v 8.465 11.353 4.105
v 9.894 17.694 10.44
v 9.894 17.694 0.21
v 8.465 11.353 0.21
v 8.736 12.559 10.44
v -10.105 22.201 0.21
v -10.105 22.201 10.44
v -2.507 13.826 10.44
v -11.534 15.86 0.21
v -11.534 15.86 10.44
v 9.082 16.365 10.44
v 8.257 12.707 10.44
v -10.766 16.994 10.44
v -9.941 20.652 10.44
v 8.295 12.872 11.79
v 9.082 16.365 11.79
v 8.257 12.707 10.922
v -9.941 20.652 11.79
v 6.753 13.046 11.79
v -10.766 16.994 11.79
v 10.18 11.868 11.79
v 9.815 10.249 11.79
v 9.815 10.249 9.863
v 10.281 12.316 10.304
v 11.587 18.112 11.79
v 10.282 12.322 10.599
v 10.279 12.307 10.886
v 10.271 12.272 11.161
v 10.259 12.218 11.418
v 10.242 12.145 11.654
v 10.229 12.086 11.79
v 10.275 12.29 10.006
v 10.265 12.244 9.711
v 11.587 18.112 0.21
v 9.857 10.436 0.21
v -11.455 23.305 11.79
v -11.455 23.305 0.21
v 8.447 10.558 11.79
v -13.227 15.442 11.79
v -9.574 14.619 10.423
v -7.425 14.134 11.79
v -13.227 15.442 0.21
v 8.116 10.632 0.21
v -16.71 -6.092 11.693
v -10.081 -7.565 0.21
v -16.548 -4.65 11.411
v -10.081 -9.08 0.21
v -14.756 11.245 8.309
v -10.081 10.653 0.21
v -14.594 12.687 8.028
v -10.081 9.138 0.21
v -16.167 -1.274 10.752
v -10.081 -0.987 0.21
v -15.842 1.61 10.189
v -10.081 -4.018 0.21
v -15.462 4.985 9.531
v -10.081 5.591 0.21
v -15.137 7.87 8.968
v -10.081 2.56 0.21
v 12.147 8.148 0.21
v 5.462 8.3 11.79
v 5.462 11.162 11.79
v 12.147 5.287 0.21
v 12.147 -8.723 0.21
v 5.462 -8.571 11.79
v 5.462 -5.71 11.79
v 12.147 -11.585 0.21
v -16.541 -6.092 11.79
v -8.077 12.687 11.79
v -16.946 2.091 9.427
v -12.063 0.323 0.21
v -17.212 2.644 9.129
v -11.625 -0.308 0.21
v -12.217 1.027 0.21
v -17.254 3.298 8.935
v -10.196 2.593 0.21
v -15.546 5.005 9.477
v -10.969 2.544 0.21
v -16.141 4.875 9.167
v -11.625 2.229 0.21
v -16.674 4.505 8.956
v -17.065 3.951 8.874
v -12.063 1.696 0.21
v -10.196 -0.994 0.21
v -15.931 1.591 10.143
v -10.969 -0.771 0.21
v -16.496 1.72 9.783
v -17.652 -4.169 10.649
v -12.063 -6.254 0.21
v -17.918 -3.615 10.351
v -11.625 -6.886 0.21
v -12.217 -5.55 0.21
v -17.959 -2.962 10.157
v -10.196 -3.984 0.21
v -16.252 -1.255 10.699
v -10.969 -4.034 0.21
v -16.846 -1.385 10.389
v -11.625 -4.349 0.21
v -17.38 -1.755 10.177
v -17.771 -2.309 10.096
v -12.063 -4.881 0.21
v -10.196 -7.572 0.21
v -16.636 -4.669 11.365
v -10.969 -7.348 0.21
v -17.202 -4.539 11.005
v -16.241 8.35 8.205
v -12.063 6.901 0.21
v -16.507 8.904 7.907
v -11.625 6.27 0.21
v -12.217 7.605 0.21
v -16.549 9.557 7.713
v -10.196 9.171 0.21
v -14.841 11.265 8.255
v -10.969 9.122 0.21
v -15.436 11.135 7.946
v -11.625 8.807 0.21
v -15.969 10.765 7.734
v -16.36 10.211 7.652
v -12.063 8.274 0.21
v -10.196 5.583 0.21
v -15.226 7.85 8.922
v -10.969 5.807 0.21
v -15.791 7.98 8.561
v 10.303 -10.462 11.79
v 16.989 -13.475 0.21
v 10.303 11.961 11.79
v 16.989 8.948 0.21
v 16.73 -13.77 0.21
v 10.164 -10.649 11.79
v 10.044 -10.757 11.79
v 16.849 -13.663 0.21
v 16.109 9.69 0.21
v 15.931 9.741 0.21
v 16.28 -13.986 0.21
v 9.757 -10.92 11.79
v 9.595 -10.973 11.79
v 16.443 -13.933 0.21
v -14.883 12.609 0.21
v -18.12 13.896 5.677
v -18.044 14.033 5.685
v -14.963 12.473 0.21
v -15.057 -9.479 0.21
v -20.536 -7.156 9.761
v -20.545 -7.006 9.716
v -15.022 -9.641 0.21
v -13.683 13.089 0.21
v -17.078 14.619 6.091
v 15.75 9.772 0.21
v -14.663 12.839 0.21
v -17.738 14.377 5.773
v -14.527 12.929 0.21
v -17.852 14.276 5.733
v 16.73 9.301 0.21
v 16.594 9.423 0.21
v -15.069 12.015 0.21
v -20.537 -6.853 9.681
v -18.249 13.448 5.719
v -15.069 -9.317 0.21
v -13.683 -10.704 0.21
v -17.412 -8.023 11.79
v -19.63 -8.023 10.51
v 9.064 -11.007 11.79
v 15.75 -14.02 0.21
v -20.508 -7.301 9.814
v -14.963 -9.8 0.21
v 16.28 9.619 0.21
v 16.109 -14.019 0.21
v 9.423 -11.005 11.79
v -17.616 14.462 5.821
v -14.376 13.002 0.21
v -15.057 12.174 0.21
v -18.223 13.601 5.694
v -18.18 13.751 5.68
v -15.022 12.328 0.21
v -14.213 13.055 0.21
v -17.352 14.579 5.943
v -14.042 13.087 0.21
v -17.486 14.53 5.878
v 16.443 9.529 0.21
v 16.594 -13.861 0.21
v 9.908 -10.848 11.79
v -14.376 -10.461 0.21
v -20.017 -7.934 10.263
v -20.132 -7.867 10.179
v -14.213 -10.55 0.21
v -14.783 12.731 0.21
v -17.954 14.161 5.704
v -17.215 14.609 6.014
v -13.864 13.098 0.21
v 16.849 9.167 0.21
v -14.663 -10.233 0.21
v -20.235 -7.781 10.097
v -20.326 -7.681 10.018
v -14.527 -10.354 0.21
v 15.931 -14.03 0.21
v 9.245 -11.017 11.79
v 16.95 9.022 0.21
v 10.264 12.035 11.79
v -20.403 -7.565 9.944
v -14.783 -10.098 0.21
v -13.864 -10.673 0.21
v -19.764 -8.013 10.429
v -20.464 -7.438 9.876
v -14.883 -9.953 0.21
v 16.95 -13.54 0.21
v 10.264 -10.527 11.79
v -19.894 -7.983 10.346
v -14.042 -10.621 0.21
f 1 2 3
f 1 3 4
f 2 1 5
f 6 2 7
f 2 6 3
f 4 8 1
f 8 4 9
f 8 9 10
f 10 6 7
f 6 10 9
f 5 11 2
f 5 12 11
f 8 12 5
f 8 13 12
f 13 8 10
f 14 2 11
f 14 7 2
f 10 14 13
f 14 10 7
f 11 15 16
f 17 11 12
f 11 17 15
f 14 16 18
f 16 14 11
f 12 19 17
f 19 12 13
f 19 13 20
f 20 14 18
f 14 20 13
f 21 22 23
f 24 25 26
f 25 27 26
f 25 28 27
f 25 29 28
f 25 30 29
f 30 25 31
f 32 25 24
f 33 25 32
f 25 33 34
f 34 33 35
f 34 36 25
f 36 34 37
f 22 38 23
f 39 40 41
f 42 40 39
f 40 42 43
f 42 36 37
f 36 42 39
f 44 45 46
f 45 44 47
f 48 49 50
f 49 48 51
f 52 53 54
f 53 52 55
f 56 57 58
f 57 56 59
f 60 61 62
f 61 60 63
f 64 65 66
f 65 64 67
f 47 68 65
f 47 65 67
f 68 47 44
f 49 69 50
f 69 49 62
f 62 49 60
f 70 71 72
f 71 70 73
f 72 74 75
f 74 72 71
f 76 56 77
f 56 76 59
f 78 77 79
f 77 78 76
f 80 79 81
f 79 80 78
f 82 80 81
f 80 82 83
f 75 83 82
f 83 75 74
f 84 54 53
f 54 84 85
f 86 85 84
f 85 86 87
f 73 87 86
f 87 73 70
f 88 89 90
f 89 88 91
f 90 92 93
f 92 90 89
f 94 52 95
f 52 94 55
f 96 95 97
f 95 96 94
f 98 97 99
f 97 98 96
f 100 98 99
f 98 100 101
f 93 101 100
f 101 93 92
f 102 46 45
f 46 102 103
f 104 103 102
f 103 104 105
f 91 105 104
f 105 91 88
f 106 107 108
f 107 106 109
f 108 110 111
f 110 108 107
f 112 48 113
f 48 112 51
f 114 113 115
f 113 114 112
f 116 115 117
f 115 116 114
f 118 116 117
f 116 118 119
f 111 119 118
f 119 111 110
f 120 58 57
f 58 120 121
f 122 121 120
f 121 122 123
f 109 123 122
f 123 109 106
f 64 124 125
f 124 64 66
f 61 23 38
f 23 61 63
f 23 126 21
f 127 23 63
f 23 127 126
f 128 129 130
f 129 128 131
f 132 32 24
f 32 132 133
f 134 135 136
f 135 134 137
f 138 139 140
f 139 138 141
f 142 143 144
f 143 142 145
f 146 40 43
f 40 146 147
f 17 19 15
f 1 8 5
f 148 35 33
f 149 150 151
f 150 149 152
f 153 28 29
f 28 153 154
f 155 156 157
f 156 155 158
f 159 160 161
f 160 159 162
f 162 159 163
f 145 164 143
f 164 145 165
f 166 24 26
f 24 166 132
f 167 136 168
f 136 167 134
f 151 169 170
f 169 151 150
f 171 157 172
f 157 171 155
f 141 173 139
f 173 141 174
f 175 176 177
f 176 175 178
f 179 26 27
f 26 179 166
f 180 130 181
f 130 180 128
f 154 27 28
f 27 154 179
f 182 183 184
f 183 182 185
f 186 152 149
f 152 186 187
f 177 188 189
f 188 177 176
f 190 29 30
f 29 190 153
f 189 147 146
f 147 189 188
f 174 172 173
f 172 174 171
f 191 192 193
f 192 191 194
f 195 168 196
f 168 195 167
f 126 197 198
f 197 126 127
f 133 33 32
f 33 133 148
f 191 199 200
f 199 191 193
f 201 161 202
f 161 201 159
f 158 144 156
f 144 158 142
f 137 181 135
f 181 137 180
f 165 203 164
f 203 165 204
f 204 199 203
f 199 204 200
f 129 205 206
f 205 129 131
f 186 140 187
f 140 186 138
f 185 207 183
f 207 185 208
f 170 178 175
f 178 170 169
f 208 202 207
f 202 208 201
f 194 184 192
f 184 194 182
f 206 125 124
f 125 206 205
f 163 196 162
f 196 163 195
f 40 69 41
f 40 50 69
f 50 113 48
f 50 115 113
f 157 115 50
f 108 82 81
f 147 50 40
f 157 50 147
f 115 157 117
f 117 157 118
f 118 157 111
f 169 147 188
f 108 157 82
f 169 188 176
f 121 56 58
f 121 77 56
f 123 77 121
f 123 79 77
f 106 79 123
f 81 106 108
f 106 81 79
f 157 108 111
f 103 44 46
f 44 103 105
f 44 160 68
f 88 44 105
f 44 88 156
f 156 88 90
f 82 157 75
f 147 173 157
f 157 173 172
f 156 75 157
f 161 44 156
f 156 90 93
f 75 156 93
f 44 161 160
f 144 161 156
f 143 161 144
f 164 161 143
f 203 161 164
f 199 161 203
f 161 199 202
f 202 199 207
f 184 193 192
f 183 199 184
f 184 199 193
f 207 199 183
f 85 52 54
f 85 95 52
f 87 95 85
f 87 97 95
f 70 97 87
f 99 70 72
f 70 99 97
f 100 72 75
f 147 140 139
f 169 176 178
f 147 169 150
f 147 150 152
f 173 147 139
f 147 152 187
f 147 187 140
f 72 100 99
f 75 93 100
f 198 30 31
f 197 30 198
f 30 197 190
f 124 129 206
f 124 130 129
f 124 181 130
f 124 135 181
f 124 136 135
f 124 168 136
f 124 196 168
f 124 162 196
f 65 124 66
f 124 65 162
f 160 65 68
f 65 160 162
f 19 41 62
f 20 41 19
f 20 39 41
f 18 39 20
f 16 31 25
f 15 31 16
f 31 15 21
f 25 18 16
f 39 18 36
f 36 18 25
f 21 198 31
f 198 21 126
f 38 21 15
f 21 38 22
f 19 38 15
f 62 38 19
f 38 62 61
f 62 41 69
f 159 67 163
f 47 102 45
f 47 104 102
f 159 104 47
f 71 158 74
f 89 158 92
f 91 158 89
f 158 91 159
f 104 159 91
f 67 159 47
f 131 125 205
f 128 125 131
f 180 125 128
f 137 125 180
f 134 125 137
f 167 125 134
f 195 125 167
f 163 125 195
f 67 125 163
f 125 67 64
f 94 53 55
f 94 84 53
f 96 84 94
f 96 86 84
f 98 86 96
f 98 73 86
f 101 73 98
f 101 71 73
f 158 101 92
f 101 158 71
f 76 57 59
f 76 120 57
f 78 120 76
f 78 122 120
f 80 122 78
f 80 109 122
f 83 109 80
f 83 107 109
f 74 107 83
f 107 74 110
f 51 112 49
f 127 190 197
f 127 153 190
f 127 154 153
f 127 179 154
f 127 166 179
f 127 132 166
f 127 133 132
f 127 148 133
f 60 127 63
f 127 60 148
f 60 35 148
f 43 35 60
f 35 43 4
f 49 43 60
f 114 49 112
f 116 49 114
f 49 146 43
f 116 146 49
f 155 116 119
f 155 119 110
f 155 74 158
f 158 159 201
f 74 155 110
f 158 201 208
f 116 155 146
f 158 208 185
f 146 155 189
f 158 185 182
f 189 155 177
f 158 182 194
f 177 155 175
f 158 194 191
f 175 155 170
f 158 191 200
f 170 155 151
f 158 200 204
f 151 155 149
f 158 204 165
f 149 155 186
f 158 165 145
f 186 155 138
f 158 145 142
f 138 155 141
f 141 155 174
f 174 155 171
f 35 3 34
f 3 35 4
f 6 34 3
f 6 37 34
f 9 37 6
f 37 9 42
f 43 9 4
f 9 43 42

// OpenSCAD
// file: Abar.scad
// generate C-channel for later use in cut-outs

mW = 16.33;
mH = 12.66;
L = 120;
pad=.1;
W = mW+pad;
H = mH+pad;
block = [L,W,H];
cutW = (1.5 * 2) + (pad * 2);
cutH = (2.0 + pad);

module abar(bblock=block){

translate([0,0,H/2])
difference(){
	cube(bblock, center=true);
	
	translate([0,0,cutH/2+.01])
		cube([L,W-cutW, H-cutH], center=true);
	}
}

abar();
// main file
// attach things to base...

use <./Abar.scad>

cB=25;
tubeXY = 19.25;
swX = 20.5;
swY = 10.3;
swZ = 6.5;
wireThick = 3.1;
wireZ = 3.65;
wire1 = 1.11;
wire2 = 12.5;
wire3 = 19.5;
leverHinge = 3.4;
leverExtends = 19.35;
hole1X = 5.15;
hole2X = 14.67;
holeY = 2.78;
holeRad = 2.5/2;
sur = 1.56;
totalX = sur*2 + swX;
totalY = sur + swY;
totalZ = swZ + sur;
posX = totalX/2;
posY = totalY/2 + sur/2;
posZ = totalZ/2;
groove= 1.75;
pH = 30;
Ang = -120;

module switch(){
	cube([swX,swY,swZ], center=true);
	translate([0 ,-posY,-.1])
		cube([wire3, 3+2+.1, wireZ+.1], center=true);
}

module switchbox(){
	difference(){
		union(){
		translate([totalX/2,totalY/2,totalZ/2])
			cube([totalX,totalY-.1,totalZ], center=true);			
		}
		translate([posX,posY,posZ])
			switch();
	}
}

module aluTube(){
	cube([tubeXY,tubeXY, pH+.1], center=true);
	translate([tubeXY/2+.1, 0, 0])
		cylinder(r=groove, h=pH+.1, center=true, $fn=16);
	translate([tubeXY/2+.1, tubeXY/3, 0])
		cylinder(r=groove, h=pH+.1, center=true, $fn=16);
	translate([tubeXY/2+.1, -tubeXY/3, 0])
		cylinder(r=groove, h=pH+.1, center=true, $fn=16);
	hull(){
	translate([-tubeXY/2 - sur*2+.2, 0, -pH/2]) rotate([0,-90,0])
		cylinder(r1=tubeXY/2-3, r2=tubeXY/2+sur*4-3, h=sur*4+.1, center=true);
	translate([-tubeXY/2 - sur*2+.2, 0, pH/2]) rotate([0,-90,0])
		cylinder(r1=tubeXY/2-3, r2=tubeXY/2+sur*4-3, h=sur*4+.1,center=true);
		}
}

module plasticTube(cH=pH/2){
	minkowski(){
	cube([tubeXY+sur*4,tubeXY+sur, cH], center=true);
	cylinder(r=1.2, h=cH, $fn=48, center=true);
	}

}

module holderclip(){
	difference(){
	plasticTube();
	aluTube();
	}
}

module placeBox(){
	difference(){
		union(){
		translate([-totalX/6-(pH/2*sin(-Ang)-3.7),-tubeXY/2-swY/2-.667,-pH/3]) rotate([90,0,12.7])
		switchbox();
	rotate([12.7,90-Ang,0])
		holderclip();
		}
	translate([-totalX/2,-tubeXY/2,-pH/3+posY-26.5]) rotate([0,0,12.7])
	cube([100,100,40],center=true);
	translate([-totalX/2,-tubeXY,+pH/3-posY+18.5]) rotate([0,0,12.7])
	cube([100,100,40], center=true);
	}
}
//holderclip();
translate([0,0,(26.5-18.5)/4]) rotate([180,0,0])
placeBox();
